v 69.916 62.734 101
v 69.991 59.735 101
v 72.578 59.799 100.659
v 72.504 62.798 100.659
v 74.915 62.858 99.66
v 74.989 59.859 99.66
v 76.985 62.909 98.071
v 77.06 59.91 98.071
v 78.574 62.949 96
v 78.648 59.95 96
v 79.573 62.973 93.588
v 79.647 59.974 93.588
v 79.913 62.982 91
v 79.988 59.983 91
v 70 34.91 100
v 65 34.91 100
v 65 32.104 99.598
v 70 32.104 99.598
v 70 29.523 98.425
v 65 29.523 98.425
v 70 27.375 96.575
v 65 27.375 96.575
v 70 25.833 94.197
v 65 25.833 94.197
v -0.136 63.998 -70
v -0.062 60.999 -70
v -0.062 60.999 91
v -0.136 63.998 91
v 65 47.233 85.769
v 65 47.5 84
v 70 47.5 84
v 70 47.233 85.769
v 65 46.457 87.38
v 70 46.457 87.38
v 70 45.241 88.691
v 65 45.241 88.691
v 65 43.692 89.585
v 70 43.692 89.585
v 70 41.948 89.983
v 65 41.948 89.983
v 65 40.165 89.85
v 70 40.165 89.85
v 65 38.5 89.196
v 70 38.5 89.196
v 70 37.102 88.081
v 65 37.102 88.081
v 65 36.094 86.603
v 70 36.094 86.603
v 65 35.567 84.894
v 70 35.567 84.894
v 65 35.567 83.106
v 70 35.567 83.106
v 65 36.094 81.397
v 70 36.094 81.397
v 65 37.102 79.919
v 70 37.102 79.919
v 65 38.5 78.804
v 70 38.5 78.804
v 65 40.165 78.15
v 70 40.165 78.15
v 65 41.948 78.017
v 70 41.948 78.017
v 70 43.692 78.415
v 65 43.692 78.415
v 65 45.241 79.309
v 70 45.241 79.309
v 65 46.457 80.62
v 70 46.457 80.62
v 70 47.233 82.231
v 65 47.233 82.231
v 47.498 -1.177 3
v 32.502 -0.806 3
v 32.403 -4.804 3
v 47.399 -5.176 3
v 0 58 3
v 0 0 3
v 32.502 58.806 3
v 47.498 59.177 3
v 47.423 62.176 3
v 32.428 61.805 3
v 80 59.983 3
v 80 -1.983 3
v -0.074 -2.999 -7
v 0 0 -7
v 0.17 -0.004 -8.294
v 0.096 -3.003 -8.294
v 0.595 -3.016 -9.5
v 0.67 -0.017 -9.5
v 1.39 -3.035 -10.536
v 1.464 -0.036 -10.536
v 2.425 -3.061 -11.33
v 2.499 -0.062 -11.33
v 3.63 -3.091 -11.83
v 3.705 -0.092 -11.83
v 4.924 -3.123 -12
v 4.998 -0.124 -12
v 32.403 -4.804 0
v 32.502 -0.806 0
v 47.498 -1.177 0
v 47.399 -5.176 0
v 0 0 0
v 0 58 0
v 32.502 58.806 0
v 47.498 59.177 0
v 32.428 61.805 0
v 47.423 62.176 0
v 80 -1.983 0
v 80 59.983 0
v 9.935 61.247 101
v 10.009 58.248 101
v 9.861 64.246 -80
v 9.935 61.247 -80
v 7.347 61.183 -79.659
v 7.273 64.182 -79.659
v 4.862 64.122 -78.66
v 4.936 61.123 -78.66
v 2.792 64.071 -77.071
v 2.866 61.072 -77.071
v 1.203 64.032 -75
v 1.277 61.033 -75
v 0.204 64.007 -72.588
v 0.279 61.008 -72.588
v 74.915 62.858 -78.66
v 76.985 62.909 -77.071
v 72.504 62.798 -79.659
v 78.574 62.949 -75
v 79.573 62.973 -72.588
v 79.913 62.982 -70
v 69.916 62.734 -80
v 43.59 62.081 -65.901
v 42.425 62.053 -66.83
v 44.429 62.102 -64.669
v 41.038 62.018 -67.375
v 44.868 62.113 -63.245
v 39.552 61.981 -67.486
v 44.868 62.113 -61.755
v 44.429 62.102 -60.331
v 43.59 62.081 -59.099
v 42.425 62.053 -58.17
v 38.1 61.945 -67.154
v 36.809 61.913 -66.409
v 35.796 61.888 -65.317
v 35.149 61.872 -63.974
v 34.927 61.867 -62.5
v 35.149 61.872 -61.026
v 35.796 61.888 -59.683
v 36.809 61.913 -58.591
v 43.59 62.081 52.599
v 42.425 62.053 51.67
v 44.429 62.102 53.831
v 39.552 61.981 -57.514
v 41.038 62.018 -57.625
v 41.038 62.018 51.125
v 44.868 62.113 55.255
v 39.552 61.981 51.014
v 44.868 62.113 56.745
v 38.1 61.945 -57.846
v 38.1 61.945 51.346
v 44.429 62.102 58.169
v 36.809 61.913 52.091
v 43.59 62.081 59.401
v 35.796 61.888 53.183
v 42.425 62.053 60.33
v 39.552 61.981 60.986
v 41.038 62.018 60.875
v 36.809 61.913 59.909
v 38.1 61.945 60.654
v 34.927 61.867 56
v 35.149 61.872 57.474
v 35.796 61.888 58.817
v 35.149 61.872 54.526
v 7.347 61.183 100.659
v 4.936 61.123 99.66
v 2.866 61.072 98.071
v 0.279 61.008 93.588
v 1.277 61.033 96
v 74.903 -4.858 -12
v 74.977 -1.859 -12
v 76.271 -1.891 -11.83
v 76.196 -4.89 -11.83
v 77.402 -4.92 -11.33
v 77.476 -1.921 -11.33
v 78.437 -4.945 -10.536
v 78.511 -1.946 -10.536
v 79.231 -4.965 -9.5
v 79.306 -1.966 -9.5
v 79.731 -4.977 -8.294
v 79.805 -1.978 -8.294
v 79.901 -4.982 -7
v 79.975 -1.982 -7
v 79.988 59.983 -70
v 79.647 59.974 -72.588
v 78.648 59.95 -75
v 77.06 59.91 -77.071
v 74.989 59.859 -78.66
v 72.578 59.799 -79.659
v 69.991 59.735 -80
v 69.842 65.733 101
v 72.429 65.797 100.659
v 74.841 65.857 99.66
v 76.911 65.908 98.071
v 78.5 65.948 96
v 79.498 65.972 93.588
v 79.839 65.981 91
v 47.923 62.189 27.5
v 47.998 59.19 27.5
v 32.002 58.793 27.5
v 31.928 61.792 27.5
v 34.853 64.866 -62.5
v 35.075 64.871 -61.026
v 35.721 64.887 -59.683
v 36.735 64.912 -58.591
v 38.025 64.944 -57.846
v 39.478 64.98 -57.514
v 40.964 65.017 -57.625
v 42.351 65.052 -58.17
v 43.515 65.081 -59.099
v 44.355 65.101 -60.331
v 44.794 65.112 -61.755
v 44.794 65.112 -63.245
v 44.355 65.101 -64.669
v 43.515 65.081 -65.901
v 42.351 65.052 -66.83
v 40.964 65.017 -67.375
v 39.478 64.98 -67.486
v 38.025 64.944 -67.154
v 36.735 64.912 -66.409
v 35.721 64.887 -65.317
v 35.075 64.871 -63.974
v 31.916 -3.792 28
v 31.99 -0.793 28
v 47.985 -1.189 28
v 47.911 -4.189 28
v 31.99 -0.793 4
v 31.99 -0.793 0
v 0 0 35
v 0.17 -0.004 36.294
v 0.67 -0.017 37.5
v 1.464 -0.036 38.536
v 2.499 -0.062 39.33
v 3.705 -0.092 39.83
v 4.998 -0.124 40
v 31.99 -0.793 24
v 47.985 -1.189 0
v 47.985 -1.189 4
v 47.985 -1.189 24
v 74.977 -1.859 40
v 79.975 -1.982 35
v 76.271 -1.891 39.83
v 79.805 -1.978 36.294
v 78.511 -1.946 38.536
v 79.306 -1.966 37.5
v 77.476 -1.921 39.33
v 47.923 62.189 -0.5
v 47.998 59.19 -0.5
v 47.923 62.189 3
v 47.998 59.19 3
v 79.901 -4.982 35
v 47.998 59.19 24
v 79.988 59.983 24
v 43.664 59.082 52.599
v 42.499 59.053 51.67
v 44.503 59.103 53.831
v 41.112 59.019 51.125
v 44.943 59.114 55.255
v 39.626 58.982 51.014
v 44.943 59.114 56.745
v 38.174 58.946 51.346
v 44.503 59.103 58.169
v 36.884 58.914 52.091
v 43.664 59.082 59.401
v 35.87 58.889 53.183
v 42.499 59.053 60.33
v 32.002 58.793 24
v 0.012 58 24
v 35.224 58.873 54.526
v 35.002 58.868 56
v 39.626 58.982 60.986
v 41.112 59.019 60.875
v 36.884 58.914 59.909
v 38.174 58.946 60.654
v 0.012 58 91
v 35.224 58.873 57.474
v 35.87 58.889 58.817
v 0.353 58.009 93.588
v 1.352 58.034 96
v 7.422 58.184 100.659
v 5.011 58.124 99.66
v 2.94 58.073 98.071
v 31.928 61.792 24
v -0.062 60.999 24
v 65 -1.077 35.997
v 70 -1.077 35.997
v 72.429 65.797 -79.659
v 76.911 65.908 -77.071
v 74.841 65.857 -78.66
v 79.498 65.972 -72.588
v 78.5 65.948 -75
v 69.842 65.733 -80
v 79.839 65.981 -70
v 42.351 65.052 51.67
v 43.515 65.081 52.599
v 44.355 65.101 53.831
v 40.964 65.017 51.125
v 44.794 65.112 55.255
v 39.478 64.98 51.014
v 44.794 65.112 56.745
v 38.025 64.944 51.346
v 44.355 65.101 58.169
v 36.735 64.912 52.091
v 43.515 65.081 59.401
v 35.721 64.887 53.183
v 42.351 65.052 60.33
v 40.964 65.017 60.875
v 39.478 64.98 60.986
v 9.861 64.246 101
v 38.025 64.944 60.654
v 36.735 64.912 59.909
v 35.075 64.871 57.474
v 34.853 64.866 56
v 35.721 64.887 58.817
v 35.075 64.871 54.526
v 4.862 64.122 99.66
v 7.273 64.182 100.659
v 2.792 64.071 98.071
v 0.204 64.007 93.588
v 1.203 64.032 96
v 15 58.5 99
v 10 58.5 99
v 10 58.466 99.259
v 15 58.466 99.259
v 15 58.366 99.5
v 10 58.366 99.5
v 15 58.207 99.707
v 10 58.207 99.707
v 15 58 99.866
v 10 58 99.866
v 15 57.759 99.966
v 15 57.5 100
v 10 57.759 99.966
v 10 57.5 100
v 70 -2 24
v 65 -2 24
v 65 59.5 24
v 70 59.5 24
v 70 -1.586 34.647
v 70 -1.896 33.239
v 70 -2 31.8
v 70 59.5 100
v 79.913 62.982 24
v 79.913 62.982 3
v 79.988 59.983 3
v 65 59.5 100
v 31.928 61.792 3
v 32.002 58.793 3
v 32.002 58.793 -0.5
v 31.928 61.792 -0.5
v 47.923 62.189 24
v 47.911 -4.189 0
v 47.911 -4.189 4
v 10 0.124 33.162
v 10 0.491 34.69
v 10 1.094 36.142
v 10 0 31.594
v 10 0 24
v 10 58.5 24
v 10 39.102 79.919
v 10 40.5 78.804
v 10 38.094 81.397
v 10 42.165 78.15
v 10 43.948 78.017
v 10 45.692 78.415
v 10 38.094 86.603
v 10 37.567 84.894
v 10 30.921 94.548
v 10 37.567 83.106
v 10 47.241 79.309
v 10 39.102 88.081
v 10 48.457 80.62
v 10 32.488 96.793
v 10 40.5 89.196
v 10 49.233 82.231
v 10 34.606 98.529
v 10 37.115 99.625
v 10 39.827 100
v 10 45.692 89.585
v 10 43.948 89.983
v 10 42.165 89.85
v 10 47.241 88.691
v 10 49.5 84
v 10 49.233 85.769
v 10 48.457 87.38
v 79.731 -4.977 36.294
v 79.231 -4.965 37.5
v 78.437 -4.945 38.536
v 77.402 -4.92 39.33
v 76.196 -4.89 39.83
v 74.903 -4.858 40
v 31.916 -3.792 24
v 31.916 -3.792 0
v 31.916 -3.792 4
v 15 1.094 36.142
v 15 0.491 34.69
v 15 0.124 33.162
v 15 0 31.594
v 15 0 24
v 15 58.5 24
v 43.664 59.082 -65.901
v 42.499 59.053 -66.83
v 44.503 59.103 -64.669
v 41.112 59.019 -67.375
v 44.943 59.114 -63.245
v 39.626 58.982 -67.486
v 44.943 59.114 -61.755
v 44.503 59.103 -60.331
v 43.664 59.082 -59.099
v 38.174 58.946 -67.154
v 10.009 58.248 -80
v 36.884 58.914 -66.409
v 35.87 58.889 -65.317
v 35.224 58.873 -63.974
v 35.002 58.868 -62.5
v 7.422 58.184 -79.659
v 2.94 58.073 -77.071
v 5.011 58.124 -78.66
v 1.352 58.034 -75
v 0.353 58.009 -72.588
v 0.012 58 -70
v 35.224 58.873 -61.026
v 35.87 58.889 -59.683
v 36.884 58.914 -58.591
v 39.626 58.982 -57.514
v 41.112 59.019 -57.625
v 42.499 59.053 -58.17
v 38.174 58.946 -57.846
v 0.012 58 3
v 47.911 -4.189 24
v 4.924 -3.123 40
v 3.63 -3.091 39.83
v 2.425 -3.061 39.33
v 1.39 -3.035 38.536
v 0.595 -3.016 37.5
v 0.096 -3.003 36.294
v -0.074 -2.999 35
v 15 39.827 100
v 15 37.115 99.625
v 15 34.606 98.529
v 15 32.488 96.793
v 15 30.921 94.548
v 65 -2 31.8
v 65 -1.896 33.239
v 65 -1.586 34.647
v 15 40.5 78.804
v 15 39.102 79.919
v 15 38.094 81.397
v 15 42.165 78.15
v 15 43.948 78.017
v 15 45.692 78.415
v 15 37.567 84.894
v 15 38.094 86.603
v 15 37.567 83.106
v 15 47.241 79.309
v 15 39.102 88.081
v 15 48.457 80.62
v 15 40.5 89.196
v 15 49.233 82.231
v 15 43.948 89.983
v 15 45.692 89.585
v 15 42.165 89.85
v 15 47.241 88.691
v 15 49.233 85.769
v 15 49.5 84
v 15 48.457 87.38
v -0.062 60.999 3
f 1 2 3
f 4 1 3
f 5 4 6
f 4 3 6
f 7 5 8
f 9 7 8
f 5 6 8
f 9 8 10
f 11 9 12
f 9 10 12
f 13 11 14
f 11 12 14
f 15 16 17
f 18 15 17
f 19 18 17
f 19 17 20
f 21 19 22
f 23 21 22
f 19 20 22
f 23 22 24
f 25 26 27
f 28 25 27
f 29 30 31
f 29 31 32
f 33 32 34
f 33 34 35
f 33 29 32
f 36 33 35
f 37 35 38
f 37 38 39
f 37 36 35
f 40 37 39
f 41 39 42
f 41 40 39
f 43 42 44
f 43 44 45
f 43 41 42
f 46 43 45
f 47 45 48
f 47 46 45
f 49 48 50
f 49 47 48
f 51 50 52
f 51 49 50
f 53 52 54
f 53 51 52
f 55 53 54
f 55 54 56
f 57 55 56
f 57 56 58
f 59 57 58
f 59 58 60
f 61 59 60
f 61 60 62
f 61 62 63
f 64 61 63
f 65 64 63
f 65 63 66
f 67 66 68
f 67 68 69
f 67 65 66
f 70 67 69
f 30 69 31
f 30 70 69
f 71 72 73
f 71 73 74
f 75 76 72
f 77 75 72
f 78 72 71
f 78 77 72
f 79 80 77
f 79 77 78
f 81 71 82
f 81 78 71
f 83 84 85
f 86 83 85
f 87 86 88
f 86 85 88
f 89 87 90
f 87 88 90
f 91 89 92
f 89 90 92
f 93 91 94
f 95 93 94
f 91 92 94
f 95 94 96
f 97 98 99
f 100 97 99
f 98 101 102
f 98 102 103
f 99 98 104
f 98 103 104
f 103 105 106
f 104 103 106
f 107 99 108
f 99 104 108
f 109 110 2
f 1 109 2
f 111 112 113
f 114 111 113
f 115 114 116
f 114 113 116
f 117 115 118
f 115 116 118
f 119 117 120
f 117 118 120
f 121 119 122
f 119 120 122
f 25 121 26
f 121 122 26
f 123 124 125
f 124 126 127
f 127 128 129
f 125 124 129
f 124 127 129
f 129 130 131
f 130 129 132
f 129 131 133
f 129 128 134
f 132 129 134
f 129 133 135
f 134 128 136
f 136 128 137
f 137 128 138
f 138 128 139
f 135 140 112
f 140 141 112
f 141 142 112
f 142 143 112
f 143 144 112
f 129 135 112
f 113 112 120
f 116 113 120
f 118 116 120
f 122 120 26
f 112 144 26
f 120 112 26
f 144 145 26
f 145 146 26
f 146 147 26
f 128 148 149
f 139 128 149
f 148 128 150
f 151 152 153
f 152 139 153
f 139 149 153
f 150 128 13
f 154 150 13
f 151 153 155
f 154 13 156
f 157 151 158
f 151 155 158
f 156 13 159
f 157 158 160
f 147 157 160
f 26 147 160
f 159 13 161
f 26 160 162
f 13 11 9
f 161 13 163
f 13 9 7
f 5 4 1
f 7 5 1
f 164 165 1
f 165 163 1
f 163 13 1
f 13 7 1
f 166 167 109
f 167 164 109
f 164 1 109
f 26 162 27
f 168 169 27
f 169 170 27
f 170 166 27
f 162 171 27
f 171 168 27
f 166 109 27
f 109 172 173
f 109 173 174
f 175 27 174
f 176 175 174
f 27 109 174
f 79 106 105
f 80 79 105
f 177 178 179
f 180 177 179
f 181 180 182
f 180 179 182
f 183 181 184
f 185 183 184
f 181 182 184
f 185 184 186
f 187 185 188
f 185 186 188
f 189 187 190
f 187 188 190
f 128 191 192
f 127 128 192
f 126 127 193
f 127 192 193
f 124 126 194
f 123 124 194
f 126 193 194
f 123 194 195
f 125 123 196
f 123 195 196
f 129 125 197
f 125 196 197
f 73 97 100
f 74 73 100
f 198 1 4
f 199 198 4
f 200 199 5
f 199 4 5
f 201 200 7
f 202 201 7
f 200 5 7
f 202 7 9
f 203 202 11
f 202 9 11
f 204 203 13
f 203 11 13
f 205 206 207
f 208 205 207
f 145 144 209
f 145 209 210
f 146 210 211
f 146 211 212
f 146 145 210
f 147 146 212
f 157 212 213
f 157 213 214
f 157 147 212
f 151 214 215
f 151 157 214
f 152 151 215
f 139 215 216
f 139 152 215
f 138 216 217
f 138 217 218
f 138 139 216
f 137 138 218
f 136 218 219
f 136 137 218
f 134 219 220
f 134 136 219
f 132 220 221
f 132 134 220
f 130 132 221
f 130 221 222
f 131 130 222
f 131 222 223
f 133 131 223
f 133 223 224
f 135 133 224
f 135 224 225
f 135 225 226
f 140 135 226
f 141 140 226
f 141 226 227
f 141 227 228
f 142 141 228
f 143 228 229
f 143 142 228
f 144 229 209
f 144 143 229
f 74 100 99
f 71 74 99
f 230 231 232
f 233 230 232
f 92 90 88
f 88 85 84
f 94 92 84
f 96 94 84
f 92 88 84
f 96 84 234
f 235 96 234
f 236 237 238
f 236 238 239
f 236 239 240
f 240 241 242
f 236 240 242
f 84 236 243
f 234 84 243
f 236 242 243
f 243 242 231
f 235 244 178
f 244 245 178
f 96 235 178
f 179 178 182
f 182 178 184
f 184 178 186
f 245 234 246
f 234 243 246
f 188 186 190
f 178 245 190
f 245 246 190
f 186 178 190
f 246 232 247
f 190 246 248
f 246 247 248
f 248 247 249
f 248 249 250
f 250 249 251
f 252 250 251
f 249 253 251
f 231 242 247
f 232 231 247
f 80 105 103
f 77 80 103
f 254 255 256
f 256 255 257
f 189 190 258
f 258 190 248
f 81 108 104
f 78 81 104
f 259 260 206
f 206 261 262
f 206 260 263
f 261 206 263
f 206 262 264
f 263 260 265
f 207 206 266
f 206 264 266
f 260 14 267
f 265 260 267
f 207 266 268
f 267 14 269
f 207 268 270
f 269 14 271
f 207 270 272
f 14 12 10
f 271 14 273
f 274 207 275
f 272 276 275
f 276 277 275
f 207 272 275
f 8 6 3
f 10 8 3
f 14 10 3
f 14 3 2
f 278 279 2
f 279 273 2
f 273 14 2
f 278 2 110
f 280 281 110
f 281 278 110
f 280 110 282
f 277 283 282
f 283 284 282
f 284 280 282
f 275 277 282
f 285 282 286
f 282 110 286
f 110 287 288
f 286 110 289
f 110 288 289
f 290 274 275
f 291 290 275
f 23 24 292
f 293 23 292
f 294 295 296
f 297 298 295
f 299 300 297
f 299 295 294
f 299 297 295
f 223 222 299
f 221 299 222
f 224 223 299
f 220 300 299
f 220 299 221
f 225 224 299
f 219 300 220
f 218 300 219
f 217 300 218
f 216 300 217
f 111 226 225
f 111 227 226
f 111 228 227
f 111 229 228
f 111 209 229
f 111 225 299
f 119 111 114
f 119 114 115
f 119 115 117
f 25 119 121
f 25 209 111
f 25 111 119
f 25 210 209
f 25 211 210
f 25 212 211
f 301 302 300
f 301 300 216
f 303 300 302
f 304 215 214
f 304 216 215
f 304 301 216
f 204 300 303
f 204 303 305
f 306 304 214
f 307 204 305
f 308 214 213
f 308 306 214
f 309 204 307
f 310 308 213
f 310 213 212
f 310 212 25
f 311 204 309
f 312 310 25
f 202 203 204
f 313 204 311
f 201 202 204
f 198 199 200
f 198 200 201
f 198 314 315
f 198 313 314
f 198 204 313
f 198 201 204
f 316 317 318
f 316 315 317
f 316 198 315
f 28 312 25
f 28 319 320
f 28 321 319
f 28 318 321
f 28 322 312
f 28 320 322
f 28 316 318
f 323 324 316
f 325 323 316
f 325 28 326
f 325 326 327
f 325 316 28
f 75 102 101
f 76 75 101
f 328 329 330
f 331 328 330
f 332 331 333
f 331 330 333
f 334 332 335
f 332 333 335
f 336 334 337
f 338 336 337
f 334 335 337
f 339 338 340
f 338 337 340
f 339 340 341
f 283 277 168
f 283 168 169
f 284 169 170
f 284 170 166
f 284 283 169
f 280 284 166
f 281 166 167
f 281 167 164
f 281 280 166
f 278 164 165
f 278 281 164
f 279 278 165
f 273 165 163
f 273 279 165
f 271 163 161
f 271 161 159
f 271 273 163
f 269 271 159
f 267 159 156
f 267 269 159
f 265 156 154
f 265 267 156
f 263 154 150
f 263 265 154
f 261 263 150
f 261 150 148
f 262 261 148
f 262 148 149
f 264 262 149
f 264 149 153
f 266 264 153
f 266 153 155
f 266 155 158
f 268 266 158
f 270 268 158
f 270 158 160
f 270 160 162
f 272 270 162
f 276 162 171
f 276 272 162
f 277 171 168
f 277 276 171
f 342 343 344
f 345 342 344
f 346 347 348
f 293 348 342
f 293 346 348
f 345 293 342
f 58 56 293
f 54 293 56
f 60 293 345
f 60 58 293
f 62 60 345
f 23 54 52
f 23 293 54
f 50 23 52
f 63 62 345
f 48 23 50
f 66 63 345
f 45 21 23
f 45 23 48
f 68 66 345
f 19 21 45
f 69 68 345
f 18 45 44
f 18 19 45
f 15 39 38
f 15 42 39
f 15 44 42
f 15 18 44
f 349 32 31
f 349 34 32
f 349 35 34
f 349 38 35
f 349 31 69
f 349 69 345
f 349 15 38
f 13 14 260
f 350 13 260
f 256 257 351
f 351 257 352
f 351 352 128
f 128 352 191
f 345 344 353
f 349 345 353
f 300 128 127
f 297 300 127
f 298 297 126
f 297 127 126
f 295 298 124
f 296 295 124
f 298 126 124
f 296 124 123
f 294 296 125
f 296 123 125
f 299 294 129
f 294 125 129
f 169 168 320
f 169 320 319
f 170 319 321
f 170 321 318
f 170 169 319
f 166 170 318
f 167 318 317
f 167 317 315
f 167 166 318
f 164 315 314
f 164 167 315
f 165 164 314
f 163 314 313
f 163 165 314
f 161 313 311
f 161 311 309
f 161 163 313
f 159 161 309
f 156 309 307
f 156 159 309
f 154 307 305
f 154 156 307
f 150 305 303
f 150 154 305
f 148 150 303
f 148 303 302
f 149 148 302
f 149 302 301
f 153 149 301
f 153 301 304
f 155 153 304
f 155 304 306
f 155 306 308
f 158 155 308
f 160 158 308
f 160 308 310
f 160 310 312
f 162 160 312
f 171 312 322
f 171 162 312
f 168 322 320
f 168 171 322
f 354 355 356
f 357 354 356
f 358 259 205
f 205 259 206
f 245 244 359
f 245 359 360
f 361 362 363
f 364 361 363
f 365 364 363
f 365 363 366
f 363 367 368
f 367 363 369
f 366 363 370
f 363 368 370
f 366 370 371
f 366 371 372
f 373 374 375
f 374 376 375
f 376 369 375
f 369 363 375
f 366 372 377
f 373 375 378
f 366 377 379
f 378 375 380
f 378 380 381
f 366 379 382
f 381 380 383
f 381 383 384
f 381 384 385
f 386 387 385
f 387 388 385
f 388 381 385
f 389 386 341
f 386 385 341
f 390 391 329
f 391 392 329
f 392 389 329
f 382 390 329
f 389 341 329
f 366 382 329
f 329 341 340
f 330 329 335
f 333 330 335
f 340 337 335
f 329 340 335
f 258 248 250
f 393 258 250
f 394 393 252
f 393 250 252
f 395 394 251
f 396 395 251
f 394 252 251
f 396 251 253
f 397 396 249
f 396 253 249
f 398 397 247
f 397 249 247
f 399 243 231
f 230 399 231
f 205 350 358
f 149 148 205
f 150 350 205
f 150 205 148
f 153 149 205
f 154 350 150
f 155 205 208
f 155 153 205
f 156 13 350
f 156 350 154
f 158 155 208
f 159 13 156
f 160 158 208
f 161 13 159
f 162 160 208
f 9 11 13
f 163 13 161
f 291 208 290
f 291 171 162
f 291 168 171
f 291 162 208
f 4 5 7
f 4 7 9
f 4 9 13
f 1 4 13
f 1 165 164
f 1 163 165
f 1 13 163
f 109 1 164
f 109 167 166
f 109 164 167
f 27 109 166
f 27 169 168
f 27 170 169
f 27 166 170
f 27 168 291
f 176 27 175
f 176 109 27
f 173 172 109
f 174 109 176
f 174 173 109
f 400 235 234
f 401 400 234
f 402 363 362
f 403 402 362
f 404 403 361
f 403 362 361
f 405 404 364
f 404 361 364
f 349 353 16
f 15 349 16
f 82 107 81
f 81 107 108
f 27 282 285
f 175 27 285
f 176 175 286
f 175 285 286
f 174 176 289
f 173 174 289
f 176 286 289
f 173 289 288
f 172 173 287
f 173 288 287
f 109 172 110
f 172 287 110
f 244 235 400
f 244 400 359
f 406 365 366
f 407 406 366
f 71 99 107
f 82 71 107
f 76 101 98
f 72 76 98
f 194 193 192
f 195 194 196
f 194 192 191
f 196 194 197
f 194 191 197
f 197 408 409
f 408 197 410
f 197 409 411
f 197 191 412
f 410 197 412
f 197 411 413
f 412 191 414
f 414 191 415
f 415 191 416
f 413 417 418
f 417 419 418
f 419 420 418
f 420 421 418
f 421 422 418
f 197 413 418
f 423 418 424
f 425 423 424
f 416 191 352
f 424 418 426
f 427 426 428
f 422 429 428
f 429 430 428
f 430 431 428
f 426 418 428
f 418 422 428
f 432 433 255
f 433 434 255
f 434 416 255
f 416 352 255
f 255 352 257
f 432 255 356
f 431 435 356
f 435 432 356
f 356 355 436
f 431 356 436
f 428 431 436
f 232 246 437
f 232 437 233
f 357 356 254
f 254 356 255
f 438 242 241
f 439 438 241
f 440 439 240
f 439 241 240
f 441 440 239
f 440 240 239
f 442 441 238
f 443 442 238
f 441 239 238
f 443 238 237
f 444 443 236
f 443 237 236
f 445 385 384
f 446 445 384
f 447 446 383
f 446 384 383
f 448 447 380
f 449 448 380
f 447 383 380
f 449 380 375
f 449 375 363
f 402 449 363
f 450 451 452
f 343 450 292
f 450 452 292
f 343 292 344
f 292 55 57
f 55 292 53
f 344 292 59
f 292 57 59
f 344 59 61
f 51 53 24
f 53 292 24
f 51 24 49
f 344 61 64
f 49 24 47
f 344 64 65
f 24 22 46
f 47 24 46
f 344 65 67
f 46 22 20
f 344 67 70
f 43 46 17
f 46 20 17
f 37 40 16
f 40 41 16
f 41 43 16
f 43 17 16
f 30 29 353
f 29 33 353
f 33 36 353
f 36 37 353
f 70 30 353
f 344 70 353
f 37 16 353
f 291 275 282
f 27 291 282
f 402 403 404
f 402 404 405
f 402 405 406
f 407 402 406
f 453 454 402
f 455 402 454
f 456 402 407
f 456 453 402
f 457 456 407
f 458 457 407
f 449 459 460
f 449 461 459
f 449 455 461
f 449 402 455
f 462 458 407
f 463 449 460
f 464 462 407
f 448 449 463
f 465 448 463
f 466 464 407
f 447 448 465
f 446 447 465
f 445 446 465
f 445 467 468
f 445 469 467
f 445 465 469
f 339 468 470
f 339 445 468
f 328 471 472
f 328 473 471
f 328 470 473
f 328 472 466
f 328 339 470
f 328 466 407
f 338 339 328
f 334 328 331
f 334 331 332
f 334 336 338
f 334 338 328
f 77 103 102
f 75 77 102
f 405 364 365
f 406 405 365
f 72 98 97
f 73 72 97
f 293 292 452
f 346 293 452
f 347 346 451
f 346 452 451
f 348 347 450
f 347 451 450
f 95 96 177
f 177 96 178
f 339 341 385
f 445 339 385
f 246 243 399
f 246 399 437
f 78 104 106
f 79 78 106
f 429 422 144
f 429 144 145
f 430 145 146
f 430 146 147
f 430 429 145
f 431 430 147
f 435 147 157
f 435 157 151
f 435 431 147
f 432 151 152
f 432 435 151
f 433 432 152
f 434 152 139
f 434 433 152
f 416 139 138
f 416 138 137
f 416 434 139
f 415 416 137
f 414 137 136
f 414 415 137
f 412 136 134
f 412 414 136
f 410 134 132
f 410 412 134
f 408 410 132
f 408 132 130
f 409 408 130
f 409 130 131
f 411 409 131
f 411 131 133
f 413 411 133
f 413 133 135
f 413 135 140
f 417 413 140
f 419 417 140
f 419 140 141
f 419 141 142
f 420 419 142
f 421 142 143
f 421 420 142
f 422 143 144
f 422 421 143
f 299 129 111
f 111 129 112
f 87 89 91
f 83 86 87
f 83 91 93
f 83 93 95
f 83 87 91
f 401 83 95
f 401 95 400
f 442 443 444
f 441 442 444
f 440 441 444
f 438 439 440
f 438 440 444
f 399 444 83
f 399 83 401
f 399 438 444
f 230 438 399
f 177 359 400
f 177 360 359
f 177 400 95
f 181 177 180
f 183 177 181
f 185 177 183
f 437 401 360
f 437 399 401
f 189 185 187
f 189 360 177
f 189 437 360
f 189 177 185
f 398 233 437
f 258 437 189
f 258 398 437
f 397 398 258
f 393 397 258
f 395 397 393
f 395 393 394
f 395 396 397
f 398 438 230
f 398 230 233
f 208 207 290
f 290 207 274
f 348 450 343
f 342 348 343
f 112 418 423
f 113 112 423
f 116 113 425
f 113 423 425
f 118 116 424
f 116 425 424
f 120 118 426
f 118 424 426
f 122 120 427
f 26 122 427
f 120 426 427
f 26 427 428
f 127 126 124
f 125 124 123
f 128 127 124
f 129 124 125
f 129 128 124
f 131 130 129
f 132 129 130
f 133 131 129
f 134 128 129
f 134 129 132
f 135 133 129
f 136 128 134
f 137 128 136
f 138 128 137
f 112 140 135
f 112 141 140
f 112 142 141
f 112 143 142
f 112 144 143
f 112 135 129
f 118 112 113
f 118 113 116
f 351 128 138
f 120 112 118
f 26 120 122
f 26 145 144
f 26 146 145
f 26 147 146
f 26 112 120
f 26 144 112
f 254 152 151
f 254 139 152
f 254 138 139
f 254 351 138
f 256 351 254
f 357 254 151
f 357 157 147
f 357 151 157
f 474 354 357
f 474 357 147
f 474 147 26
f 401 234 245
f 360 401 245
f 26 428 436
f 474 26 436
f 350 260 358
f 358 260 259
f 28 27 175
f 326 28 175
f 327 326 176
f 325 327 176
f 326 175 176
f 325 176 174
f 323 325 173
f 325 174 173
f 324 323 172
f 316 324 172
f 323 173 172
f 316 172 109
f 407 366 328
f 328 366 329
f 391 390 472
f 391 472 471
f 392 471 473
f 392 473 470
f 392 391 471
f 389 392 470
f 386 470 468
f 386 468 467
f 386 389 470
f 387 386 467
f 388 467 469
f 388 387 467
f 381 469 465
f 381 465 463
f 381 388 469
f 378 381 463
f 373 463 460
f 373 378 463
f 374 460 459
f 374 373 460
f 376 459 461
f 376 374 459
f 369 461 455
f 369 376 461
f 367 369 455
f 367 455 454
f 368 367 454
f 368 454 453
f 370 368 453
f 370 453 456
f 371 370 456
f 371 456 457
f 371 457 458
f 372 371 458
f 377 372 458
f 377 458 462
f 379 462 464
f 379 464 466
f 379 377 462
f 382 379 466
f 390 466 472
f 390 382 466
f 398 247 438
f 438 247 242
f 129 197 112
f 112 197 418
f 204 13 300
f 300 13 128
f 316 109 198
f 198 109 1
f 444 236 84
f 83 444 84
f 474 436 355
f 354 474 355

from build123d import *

# Parameters (mm, degrees)
F1_DEPTH  = 3
F2_W      = 16
F2_H      = 4
F3_DEPTH  = 3
F4_R      = 5
F5_DEPTH  = 3
F6_R      = 5
F7_DEPTH  = 3
F8_R      = 6
F9_DEPTH  = 5
F11_R     = 6
F12_DEPTH = 5


with BuildPart() as f1:
    # F0 (on Top) → F1 (new body)
    with BuildSketch(Plane.XY):
        Polygon((32.502303, 58.805691), (0, 58), (0, 0), (32.502303, -0.805691), (32.403179, -4.804463), (47.398572, -5.17618), (47.497697, -1.177409), (80, -1.9831), (80, 59.9831), (47.497697, 59.177409), (47.423353, 62.176487), (32.42796, 61.80477), align=None)
    extrude(amount=F1_DEPTH)


with BuildPart() as f3:
    # F2 (on face) → F3 (new body)
    with BuildSketch(Plane(origin=(0, 0, 0), x_dir=(0.999693, -0.024781, 0), z_dir=(-0.024781, -0.999693, 0))):
        with BuildLine():
            ThreePointArc((0, -7), (1.464466, -10.535534), (5, -12))
            Line((5, -12), (75, -12))
            ThreePointArc((75, -12), (78.535534, -10.535534), (80, -7))
            Line((80, -7), (80, 35))
            ThreePointArc((80, 35), (78.535534, 38.535534), (75, 40))
            Line((75, 40), (5, 40))
            ThreePointArc((5, 40), (1.464466, 38.535534), (0, 35))
            Line((0, 35), (0, -7))
        make_face()
        with Locations((40, 2)):
            Rectangle(F2_W, F2_H, mode=Mode.SUBTRACT)
        with Locations((40, 26)):
            Rectangle(F2_W, F2_H, mode=Mode.SUBTRACT)
    extrude(amount=F3_DEPTH)


with BuildPart() as f5:
    # F4 (on face) → F5 (new body)
    with BuildSketch(Plane(origin=(-1.436865, 57.964382, 0), x_dir=(-0.999693, -0.024781, 0), z_dir=(-0.024781, 0.999693, 0))):
        with BuildLine():
            ThreePointArc((-81.449594, -70), (-78.520662, -77.071068), (-71.449594, -80))
            Line((-71.449594, -80), (-11.449594, -80))
            ThreePointArc((-11.449594, -80), (-4.378526, -77.071068), (-1.449594, -70))
            Line((-1.449594, -70), (-1.449594, 3))
            Line((-1.449594, 3), (-33.449594, 3))
            Line((-33.449594, 3), (-33.449594, -0.5))
            Line((-33.449594, -0.5), (-49.449594, -0.5))
            Line((-49.449594, -0.5), (-49.449594, 3))
            Line((-49.449594, 3), (-81.449594, 3))
            Line((-81.449594, 3), (-81.449594, -70))
        make_face()
        with Locations((-41.449594, -62.5)):
            Circle(F4_R, mode=Mode.SUBTRACT)
        with BuildLine():
            Line((-11.449594, 101), (-71.449594, 101))
            ThreePointArc((-71.449594, 101), (-78.520662, 98.071068), (-81.449594, 91))
            Line((-81.449594, 91), (-81.449594, 24))
            Line((-81.449594, 24), (-49.449594, 24))
            Line((-49.449594, 24), (-49.449594, 27.5))
            Line((-49.449594, 27.5), (-33.449594, 27.5))
            Line((-33.449594, 27.5), (-33.449594, 24))
            Line((-33.449594, 24), (-1.449594, 24))
            Line((-1.449594, 24), (-1.449594, 91))
            ThreePointArc((-1.449594, 91), (-4.378526, 98.071068), (-11.449594, 101))
        make_face()
        with Locations((-41.449594, 56)):
            Circle(F4_R, mode=Mode.SUBTRACT)
    extrude(amount=F5_DEPTH)


with BuildPart() as f7:
    # F6 (on face) → F7 (new body)
    with BuildSketch(Plane(origin=(-1.511208, 60.963461, 0), x_dir=(-0.999693, -0.024781, 0), z_dir=(-0.024781, 0.999693, 0))):
        with BuildLine():
            ThreePointArc((-81.449594, -70), (-78.520662, -77.071068), (-71.449594, -80))
            Line((-71.449594, -80), (-11.449594, -80))
            ThreePointArc((-11.449594, -80), (-4.378526, -77.071068), (-1.449594, -70))
            Line((-1.449594, -70), (-1.449594, 91))
            ThreePointArc((-1.449594, 91), (-4.378526, 98.071068), (-11.449594, 101))
            Line((-11.449594, 101), (-71.449594, 101))
            ThreePointArc((-71.449594, 101), (-78.520662, 98.071068), (-81.449594, 91))
            Line((-81.449594, 91), (-81.449594, -70))
        make_face()
        with Locations((-41.449594, -62.5)):
            Circle(F6_R, mode=Mode.SUBTRACT)
        with Locations((-41.449594, 56)):
            Circle(F6_R, mode=Mode.SUBTRACT)
    extrude(amount=F7_DEPTH)


with BuildPart() as f9:
    # F8 (on Right) → F9 (new body)
    with BuildSketch(Plane.YZ):
        with BuildLine():
            Line((0, 24), (58.5, 24))
            Line((58.5, 24), (58.5, 99))
            ThreePointArc((58.5, 99), (58.207107, 99.707107), (57.5, 100))
            Line((57.5, 100), (39.826997, 100))
            ThreePointArc((39.826997, 100), (34.60594, 98.528808), (30.921119, 94.548114))
            Line((30.921119, 94.548114), (1.094122, 36.142453))
            ThreePointArc((1.094122, 36.142453), (0.277377, 33.933272), (0, 31.594339))
            Line((0, 31.594339), (0, 24))
        make_face()
        with Locations((43.5, 84)):
            Circle(F8_R, mode=Mode.SUBTRACT)
    extrude(amount=F9_DEPTH)


with BuildPart() as f9_1:
    # F10: moved
    add(f9.part.moved(Location((10, 0, 0))))


with BuildPart() as f12:
    # F11 (on Right) → F12 (new body)
    with BuildSketch(Plane.YZ):
        with BuildLine():
            Line((0, 31.800063), (0, 24))
            Line((0, 24), (61.5, 24))
            Line((61.5, 24), (61.5, 100))
            Line((61.5, 100), (36.90959, 100))
            ThreePointArc((36.90959, 100), (31.522923, 98.425189), (27.832852, 94.196763))
            Line((27.832852, 94.196763), (0.923261, 35.996825))
            ThreePointArc((0.923261, 35.996825), (0.233542, 33.948622), (0, 31.800063))
        make_face()
        with Locations((43.5, 84)):
            Circle(F11_R, mode=Mode.SUBTRACT)
    extrude(amount=F12_DEPTH)


with BuildPart() as f12_1:
    # F13: moved
    add(f12.part.moved(Location((65, -2, 0))))


solid = Compound([f1.part, f3.part, f5.part, f7.part, f9_1.part, f12_1.part])
